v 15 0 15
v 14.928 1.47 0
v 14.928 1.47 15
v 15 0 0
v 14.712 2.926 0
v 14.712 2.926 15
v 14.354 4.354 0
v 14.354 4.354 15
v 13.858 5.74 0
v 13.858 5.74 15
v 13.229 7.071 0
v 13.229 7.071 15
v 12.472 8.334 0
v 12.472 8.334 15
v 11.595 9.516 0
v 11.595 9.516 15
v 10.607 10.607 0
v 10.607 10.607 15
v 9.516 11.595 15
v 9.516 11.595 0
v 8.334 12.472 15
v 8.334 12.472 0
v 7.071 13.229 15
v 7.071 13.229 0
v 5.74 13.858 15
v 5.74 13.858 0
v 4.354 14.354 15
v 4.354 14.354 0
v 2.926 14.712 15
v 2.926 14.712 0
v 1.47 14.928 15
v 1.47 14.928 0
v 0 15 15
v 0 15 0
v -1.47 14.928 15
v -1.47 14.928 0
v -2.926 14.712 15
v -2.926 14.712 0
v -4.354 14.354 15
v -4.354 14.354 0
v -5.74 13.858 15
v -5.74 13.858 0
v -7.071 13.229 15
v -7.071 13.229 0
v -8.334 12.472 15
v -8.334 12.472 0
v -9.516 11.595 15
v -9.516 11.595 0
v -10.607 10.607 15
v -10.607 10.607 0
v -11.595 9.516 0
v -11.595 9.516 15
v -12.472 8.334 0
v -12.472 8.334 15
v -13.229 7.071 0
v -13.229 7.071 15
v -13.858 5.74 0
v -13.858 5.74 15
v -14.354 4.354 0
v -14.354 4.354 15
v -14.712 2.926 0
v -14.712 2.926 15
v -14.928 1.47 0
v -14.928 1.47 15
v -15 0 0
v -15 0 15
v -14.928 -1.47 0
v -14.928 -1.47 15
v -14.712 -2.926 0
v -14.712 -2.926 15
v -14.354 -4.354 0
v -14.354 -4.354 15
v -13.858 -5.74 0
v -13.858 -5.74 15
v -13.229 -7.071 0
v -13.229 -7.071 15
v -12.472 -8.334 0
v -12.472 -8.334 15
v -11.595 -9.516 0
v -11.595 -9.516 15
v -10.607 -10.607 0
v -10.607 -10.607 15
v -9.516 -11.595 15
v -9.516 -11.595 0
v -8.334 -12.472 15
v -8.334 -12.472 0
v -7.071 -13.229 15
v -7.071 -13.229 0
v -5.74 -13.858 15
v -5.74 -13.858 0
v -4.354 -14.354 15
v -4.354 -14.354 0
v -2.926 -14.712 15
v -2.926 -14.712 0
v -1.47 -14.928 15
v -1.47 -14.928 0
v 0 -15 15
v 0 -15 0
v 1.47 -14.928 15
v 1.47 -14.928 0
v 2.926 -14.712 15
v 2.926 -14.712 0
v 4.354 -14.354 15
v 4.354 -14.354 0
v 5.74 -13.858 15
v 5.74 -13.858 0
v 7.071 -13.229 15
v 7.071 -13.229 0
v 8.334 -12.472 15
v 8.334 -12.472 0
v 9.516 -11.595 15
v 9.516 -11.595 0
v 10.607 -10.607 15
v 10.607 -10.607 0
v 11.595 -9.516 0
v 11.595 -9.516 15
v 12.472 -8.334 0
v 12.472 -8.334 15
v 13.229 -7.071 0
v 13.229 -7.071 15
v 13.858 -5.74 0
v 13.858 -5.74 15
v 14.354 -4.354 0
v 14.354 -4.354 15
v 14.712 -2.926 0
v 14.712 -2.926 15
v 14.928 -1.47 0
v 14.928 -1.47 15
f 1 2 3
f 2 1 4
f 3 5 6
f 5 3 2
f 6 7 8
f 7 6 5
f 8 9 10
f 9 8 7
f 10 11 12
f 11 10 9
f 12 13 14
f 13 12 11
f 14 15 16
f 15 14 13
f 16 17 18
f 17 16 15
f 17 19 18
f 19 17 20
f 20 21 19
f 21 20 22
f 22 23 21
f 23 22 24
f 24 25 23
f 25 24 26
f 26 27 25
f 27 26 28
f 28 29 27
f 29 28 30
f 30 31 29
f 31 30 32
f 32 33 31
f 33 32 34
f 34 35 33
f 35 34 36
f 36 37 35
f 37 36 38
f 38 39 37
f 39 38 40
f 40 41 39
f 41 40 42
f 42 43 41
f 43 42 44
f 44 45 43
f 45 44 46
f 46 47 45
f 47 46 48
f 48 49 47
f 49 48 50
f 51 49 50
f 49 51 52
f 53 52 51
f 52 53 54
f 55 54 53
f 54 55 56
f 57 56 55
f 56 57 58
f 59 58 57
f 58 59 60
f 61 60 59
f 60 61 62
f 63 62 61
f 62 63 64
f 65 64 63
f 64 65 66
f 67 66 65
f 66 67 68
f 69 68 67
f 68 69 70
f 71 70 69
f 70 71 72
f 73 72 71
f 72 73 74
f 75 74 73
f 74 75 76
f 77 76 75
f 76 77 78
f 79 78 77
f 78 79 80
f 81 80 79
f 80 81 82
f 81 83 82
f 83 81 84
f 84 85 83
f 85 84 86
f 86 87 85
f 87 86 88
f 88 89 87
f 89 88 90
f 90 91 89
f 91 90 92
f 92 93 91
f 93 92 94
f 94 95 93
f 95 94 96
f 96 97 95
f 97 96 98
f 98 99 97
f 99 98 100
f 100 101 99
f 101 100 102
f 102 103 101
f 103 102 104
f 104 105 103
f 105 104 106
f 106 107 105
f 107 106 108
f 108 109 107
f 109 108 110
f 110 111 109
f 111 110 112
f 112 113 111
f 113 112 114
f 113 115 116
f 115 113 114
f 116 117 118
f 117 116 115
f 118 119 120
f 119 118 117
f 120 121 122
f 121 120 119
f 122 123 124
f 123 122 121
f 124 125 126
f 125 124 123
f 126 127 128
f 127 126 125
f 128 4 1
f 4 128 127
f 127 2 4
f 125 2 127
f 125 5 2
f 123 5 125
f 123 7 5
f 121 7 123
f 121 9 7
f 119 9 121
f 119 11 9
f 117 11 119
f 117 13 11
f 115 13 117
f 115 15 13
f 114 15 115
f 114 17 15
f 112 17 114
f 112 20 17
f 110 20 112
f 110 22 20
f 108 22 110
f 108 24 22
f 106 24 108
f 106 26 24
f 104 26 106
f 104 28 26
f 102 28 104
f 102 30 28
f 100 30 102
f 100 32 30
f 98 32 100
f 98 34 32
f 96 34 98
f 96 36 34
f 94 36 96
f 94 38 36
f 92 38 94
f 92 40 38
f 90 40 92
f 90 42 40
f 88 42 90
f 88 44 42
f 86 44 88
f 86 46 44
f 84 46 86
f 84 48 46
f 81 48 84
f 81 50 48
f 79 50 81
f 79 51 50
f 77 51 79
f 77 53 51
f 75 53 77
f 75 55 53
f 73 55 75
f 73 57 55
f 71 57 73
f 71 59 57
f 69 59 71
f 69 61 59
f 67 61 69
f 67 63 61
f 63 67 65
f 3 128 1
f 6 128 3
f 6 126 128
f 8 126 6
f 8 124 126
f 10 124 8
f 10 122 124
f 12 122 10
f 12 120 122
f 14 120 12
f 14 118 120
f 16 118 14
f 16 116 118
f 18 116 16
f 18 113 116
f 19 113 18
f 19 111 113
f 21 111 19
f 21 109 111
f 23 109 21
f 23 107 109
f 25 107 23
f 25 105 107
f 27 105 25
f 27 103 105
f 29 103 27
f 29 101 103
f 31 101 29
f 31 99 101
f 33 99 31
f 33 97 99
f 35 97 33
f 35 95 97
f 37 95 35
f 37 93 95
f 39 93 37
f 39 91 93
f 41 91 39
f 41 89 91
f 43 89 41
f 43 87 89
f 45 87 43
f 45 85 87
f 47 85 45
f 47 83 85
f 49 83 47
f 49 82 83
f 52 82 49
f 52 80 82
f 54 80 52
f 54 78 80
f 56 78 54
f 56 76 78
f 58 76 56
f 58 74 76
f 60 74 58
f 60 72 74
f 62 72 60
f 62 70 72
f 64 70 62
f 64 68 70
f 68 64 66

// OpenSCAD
// Dimensions
$fn = 64;

// Knob overall dimensions
knob_diameter = 30;
knob_height = 15;

// D-shaft bore dimensions
d_shaft_diameter = 6.2;
d_shaft_flat_width = 4.7;
d_shaft_depth = 12;

// Groove dimensions
groove_diameter = 2;
groove_count = 18;
groove_depth = knob_height; // full height

// Pointer groove
pointer_width = 1.5;
pointer_depth = 1;

// Center the knob on origin in X and Y, bottom at z = 0
// Print orientation: bottom face (z=0) on bed, builds upward

// Create base knob cylinder
cylinder(h = knob_height, d = knob_diameter, center = false);

// Cut D-shaped blind bore from bottom (z=0) up to z = d_shaft_depth
// Use difference to remove material from the cylinder

// First, create the D-shaped bore: a circle with one side flat
// The D-shape has a flat side of width d_shaft_flat_width, and the full diameter is d_shaft_diameter
// So the circle has radius = d_shaft_diameter / 2 = 3.1 mm
// The flat is on one side, so we'll make a rectangle of width d_shaft_flat_width and height d_shaft_diameter,
// and subtract a half-circle from one side to form the D-shape

// But easier: use a cylinder with a rectangular cutout on one side
// We'll use a cylinder of diameter d_shaft_diameter, and subtract a rectangular prism from one side,
// but only for the depth of the bore

// Create a D-shaped hole: a circle with a flat side
// We'll make a cylinder of diameter d_shaft_diameter, and subtract a rectangular prism from one side,
// but only for the depth of the bore

// Instead, use a polygon to define the D-shape in the XY plane, then extrude it

// Define the D-shape: a semicircle with a flat side
// The flat side is d_shaft_flat_width = 4.7 mm, so the radius is 3.1 mm
// The D-shape is a circle of radius 3.1 mm, but with one side cut flat to 4.7 mm
// So the D-shape has a flat side of 4.7 mm and a curved side of radius 3.1 mm

// We'll define the D-shape as a polygon: start at the center of the flat side, go along the flat, then follow the arc

// Actually, simpler: use a cylinder of diameter d_shaft_diameter, and subtract a rectangular prism that is 4.7 mm wide and 6.2 mm high,
// but offset so it cuts one side of the cylinder

// But we need a D-shape, so we'll define a polygon that is a D-shape

// D-shape: a semicircle with a flat side of 4.7 mm
// The full diameter is 6.2 mm, so radius = 3.1 mm
// The flat side is 4.7 mm, so the D-shape is not a perfect semicircle — it's a circle with a flat side of 4.7 mm
// That means the chord length is 4.7 mm, and the radius is 3.1 mm

// We can compute the angle of the chord: angle = 2 * asin( (4.7/2) / 3.1 ) = 2 * asin(2.35 / 3.1) ≈ 2 * 50.3° ≈ 100.6°

// So the D-shape is a circle of radius 3.1 mm, with a chord of 4.7 mm, so the arc is 100.6° on one side, and the flat is 4.7 mm

// But for OpenSCAD, we can define the D-shape as a polygon: start at the center of the flat side, go to the end of the flat, then follow the arc

// Actually, let's do it differently: create a cylinder of diameter 6.2 mm, and subtract a rectangular prism that is 4.7 mm wide and 6.2 mm long, but only for the depth of the bore

// But that would leave a flat side of 4.7 mm, but the hole would be a rectangle with semicircular ends? No.

// Better: use a cylinder of diameter 6.2 mm, and subtract a rectangular prism that is 4.7 mm wide and 6.2 mm long, but only for the depth of the bore

// But that would not give a D-shape.

// Correct way: the D-shape is a circle with a flat side. So we can define a polygon that is a D-shape.

// Let's define the D-shape as a polygon with:
// - Start at (0, -3.1) — bottom of the circle
// - Go to (2.35, -3.1) — right end of flat
// - Then follow the arc of the circle to (2.35, 3.1) — top right
// - Then to (0, 3.1) — top of the circle
// - Then to (-2.35, 3.1) — top left
// - Then follow the arc to (-2.35, -3.1) — bottom left
// - Then to (0, -3.1) — back to start

// But that's a full circle. We want a D-shape: a circle with a flat side.

// Actually, the D-shape has a flat side of 4.7 mm, so the chord is 4.7 mm, so the two points are at (±2.35, y) where y is such that the distance from center is 3.1 mm

// The flat side is at the bottom, so the flat side is from (-2.35, -3.1) to (2.35, -3.1), and the rest is a semicircle

// But that would make the flat side at the bottom, and the curved side on top

// But the D-shaft has the flat side on one side, so we want the flat side to be on the side

// Actually, the D-shaft has a flat side of 4.7 mm, so the diameter is 6.2 mm, so the radius is 3.1 mm, and the flat side is 4.7 mm, so the chord length is 4.7 mm

// The angle θ from the center to each end of the flat side is: θ = asin( (4.7/2) / 3.1 ) = asin(2.35 / 3.1) ≈ 50.3°

// So the D-shape is a circle of radius 3.1 mm, with a flat side that spans from angle -50.3° to +50.3° on the bottom

// So the D-shape polygon: start at the center of the flat side (0, -3.1), go to (2.35, -3.1), then follow the arc from angle 50.3° to 180° to 230.3°? No.

// Actually, the D-shape has a flat side of 4.7 mm, so the two points are at:
// - (2.35, -3.1) and (-2.35, -3.1), and the rest is a semicircle from (-2.35, -3.1) to (2.35, -3.1) through the top

// But that would be a semicircle of radius 3.1 mm, but the chord is 4.7 mm, so the height of the arc is 3.1 mm, so the total height of the D-shape is 6.2 mm

// But the D-shaft has a flat side of 4.7 mm, so the D-shape has a flat side of 4.7 mm and a curved side of radius 3.1 mm

// So the D-shape polygon: start at (-2.35, -3.1), go to (2.35, -3.1), then follow the arc of the circle from angle 0° to 180° (but centered at origin)

// Actually, the circle is centered at (0,0), so the points are:
// - (-2.35, -3.1) and (2.35, -3.1) are on the circle: x^2 + y^2 = 3.1^2 = 9.61
// - (-2.35)^2 + (-3.1)^2 = 5.5225 + 9.61 = 15.1325 ≠ 9.61 — not on the circle

// So they are not on the circle.

// Let's calculate the correct points.

// The flat side is 4.7 mm, so the two points are at (±2.35, y), and they are on the circle of radius 3.
